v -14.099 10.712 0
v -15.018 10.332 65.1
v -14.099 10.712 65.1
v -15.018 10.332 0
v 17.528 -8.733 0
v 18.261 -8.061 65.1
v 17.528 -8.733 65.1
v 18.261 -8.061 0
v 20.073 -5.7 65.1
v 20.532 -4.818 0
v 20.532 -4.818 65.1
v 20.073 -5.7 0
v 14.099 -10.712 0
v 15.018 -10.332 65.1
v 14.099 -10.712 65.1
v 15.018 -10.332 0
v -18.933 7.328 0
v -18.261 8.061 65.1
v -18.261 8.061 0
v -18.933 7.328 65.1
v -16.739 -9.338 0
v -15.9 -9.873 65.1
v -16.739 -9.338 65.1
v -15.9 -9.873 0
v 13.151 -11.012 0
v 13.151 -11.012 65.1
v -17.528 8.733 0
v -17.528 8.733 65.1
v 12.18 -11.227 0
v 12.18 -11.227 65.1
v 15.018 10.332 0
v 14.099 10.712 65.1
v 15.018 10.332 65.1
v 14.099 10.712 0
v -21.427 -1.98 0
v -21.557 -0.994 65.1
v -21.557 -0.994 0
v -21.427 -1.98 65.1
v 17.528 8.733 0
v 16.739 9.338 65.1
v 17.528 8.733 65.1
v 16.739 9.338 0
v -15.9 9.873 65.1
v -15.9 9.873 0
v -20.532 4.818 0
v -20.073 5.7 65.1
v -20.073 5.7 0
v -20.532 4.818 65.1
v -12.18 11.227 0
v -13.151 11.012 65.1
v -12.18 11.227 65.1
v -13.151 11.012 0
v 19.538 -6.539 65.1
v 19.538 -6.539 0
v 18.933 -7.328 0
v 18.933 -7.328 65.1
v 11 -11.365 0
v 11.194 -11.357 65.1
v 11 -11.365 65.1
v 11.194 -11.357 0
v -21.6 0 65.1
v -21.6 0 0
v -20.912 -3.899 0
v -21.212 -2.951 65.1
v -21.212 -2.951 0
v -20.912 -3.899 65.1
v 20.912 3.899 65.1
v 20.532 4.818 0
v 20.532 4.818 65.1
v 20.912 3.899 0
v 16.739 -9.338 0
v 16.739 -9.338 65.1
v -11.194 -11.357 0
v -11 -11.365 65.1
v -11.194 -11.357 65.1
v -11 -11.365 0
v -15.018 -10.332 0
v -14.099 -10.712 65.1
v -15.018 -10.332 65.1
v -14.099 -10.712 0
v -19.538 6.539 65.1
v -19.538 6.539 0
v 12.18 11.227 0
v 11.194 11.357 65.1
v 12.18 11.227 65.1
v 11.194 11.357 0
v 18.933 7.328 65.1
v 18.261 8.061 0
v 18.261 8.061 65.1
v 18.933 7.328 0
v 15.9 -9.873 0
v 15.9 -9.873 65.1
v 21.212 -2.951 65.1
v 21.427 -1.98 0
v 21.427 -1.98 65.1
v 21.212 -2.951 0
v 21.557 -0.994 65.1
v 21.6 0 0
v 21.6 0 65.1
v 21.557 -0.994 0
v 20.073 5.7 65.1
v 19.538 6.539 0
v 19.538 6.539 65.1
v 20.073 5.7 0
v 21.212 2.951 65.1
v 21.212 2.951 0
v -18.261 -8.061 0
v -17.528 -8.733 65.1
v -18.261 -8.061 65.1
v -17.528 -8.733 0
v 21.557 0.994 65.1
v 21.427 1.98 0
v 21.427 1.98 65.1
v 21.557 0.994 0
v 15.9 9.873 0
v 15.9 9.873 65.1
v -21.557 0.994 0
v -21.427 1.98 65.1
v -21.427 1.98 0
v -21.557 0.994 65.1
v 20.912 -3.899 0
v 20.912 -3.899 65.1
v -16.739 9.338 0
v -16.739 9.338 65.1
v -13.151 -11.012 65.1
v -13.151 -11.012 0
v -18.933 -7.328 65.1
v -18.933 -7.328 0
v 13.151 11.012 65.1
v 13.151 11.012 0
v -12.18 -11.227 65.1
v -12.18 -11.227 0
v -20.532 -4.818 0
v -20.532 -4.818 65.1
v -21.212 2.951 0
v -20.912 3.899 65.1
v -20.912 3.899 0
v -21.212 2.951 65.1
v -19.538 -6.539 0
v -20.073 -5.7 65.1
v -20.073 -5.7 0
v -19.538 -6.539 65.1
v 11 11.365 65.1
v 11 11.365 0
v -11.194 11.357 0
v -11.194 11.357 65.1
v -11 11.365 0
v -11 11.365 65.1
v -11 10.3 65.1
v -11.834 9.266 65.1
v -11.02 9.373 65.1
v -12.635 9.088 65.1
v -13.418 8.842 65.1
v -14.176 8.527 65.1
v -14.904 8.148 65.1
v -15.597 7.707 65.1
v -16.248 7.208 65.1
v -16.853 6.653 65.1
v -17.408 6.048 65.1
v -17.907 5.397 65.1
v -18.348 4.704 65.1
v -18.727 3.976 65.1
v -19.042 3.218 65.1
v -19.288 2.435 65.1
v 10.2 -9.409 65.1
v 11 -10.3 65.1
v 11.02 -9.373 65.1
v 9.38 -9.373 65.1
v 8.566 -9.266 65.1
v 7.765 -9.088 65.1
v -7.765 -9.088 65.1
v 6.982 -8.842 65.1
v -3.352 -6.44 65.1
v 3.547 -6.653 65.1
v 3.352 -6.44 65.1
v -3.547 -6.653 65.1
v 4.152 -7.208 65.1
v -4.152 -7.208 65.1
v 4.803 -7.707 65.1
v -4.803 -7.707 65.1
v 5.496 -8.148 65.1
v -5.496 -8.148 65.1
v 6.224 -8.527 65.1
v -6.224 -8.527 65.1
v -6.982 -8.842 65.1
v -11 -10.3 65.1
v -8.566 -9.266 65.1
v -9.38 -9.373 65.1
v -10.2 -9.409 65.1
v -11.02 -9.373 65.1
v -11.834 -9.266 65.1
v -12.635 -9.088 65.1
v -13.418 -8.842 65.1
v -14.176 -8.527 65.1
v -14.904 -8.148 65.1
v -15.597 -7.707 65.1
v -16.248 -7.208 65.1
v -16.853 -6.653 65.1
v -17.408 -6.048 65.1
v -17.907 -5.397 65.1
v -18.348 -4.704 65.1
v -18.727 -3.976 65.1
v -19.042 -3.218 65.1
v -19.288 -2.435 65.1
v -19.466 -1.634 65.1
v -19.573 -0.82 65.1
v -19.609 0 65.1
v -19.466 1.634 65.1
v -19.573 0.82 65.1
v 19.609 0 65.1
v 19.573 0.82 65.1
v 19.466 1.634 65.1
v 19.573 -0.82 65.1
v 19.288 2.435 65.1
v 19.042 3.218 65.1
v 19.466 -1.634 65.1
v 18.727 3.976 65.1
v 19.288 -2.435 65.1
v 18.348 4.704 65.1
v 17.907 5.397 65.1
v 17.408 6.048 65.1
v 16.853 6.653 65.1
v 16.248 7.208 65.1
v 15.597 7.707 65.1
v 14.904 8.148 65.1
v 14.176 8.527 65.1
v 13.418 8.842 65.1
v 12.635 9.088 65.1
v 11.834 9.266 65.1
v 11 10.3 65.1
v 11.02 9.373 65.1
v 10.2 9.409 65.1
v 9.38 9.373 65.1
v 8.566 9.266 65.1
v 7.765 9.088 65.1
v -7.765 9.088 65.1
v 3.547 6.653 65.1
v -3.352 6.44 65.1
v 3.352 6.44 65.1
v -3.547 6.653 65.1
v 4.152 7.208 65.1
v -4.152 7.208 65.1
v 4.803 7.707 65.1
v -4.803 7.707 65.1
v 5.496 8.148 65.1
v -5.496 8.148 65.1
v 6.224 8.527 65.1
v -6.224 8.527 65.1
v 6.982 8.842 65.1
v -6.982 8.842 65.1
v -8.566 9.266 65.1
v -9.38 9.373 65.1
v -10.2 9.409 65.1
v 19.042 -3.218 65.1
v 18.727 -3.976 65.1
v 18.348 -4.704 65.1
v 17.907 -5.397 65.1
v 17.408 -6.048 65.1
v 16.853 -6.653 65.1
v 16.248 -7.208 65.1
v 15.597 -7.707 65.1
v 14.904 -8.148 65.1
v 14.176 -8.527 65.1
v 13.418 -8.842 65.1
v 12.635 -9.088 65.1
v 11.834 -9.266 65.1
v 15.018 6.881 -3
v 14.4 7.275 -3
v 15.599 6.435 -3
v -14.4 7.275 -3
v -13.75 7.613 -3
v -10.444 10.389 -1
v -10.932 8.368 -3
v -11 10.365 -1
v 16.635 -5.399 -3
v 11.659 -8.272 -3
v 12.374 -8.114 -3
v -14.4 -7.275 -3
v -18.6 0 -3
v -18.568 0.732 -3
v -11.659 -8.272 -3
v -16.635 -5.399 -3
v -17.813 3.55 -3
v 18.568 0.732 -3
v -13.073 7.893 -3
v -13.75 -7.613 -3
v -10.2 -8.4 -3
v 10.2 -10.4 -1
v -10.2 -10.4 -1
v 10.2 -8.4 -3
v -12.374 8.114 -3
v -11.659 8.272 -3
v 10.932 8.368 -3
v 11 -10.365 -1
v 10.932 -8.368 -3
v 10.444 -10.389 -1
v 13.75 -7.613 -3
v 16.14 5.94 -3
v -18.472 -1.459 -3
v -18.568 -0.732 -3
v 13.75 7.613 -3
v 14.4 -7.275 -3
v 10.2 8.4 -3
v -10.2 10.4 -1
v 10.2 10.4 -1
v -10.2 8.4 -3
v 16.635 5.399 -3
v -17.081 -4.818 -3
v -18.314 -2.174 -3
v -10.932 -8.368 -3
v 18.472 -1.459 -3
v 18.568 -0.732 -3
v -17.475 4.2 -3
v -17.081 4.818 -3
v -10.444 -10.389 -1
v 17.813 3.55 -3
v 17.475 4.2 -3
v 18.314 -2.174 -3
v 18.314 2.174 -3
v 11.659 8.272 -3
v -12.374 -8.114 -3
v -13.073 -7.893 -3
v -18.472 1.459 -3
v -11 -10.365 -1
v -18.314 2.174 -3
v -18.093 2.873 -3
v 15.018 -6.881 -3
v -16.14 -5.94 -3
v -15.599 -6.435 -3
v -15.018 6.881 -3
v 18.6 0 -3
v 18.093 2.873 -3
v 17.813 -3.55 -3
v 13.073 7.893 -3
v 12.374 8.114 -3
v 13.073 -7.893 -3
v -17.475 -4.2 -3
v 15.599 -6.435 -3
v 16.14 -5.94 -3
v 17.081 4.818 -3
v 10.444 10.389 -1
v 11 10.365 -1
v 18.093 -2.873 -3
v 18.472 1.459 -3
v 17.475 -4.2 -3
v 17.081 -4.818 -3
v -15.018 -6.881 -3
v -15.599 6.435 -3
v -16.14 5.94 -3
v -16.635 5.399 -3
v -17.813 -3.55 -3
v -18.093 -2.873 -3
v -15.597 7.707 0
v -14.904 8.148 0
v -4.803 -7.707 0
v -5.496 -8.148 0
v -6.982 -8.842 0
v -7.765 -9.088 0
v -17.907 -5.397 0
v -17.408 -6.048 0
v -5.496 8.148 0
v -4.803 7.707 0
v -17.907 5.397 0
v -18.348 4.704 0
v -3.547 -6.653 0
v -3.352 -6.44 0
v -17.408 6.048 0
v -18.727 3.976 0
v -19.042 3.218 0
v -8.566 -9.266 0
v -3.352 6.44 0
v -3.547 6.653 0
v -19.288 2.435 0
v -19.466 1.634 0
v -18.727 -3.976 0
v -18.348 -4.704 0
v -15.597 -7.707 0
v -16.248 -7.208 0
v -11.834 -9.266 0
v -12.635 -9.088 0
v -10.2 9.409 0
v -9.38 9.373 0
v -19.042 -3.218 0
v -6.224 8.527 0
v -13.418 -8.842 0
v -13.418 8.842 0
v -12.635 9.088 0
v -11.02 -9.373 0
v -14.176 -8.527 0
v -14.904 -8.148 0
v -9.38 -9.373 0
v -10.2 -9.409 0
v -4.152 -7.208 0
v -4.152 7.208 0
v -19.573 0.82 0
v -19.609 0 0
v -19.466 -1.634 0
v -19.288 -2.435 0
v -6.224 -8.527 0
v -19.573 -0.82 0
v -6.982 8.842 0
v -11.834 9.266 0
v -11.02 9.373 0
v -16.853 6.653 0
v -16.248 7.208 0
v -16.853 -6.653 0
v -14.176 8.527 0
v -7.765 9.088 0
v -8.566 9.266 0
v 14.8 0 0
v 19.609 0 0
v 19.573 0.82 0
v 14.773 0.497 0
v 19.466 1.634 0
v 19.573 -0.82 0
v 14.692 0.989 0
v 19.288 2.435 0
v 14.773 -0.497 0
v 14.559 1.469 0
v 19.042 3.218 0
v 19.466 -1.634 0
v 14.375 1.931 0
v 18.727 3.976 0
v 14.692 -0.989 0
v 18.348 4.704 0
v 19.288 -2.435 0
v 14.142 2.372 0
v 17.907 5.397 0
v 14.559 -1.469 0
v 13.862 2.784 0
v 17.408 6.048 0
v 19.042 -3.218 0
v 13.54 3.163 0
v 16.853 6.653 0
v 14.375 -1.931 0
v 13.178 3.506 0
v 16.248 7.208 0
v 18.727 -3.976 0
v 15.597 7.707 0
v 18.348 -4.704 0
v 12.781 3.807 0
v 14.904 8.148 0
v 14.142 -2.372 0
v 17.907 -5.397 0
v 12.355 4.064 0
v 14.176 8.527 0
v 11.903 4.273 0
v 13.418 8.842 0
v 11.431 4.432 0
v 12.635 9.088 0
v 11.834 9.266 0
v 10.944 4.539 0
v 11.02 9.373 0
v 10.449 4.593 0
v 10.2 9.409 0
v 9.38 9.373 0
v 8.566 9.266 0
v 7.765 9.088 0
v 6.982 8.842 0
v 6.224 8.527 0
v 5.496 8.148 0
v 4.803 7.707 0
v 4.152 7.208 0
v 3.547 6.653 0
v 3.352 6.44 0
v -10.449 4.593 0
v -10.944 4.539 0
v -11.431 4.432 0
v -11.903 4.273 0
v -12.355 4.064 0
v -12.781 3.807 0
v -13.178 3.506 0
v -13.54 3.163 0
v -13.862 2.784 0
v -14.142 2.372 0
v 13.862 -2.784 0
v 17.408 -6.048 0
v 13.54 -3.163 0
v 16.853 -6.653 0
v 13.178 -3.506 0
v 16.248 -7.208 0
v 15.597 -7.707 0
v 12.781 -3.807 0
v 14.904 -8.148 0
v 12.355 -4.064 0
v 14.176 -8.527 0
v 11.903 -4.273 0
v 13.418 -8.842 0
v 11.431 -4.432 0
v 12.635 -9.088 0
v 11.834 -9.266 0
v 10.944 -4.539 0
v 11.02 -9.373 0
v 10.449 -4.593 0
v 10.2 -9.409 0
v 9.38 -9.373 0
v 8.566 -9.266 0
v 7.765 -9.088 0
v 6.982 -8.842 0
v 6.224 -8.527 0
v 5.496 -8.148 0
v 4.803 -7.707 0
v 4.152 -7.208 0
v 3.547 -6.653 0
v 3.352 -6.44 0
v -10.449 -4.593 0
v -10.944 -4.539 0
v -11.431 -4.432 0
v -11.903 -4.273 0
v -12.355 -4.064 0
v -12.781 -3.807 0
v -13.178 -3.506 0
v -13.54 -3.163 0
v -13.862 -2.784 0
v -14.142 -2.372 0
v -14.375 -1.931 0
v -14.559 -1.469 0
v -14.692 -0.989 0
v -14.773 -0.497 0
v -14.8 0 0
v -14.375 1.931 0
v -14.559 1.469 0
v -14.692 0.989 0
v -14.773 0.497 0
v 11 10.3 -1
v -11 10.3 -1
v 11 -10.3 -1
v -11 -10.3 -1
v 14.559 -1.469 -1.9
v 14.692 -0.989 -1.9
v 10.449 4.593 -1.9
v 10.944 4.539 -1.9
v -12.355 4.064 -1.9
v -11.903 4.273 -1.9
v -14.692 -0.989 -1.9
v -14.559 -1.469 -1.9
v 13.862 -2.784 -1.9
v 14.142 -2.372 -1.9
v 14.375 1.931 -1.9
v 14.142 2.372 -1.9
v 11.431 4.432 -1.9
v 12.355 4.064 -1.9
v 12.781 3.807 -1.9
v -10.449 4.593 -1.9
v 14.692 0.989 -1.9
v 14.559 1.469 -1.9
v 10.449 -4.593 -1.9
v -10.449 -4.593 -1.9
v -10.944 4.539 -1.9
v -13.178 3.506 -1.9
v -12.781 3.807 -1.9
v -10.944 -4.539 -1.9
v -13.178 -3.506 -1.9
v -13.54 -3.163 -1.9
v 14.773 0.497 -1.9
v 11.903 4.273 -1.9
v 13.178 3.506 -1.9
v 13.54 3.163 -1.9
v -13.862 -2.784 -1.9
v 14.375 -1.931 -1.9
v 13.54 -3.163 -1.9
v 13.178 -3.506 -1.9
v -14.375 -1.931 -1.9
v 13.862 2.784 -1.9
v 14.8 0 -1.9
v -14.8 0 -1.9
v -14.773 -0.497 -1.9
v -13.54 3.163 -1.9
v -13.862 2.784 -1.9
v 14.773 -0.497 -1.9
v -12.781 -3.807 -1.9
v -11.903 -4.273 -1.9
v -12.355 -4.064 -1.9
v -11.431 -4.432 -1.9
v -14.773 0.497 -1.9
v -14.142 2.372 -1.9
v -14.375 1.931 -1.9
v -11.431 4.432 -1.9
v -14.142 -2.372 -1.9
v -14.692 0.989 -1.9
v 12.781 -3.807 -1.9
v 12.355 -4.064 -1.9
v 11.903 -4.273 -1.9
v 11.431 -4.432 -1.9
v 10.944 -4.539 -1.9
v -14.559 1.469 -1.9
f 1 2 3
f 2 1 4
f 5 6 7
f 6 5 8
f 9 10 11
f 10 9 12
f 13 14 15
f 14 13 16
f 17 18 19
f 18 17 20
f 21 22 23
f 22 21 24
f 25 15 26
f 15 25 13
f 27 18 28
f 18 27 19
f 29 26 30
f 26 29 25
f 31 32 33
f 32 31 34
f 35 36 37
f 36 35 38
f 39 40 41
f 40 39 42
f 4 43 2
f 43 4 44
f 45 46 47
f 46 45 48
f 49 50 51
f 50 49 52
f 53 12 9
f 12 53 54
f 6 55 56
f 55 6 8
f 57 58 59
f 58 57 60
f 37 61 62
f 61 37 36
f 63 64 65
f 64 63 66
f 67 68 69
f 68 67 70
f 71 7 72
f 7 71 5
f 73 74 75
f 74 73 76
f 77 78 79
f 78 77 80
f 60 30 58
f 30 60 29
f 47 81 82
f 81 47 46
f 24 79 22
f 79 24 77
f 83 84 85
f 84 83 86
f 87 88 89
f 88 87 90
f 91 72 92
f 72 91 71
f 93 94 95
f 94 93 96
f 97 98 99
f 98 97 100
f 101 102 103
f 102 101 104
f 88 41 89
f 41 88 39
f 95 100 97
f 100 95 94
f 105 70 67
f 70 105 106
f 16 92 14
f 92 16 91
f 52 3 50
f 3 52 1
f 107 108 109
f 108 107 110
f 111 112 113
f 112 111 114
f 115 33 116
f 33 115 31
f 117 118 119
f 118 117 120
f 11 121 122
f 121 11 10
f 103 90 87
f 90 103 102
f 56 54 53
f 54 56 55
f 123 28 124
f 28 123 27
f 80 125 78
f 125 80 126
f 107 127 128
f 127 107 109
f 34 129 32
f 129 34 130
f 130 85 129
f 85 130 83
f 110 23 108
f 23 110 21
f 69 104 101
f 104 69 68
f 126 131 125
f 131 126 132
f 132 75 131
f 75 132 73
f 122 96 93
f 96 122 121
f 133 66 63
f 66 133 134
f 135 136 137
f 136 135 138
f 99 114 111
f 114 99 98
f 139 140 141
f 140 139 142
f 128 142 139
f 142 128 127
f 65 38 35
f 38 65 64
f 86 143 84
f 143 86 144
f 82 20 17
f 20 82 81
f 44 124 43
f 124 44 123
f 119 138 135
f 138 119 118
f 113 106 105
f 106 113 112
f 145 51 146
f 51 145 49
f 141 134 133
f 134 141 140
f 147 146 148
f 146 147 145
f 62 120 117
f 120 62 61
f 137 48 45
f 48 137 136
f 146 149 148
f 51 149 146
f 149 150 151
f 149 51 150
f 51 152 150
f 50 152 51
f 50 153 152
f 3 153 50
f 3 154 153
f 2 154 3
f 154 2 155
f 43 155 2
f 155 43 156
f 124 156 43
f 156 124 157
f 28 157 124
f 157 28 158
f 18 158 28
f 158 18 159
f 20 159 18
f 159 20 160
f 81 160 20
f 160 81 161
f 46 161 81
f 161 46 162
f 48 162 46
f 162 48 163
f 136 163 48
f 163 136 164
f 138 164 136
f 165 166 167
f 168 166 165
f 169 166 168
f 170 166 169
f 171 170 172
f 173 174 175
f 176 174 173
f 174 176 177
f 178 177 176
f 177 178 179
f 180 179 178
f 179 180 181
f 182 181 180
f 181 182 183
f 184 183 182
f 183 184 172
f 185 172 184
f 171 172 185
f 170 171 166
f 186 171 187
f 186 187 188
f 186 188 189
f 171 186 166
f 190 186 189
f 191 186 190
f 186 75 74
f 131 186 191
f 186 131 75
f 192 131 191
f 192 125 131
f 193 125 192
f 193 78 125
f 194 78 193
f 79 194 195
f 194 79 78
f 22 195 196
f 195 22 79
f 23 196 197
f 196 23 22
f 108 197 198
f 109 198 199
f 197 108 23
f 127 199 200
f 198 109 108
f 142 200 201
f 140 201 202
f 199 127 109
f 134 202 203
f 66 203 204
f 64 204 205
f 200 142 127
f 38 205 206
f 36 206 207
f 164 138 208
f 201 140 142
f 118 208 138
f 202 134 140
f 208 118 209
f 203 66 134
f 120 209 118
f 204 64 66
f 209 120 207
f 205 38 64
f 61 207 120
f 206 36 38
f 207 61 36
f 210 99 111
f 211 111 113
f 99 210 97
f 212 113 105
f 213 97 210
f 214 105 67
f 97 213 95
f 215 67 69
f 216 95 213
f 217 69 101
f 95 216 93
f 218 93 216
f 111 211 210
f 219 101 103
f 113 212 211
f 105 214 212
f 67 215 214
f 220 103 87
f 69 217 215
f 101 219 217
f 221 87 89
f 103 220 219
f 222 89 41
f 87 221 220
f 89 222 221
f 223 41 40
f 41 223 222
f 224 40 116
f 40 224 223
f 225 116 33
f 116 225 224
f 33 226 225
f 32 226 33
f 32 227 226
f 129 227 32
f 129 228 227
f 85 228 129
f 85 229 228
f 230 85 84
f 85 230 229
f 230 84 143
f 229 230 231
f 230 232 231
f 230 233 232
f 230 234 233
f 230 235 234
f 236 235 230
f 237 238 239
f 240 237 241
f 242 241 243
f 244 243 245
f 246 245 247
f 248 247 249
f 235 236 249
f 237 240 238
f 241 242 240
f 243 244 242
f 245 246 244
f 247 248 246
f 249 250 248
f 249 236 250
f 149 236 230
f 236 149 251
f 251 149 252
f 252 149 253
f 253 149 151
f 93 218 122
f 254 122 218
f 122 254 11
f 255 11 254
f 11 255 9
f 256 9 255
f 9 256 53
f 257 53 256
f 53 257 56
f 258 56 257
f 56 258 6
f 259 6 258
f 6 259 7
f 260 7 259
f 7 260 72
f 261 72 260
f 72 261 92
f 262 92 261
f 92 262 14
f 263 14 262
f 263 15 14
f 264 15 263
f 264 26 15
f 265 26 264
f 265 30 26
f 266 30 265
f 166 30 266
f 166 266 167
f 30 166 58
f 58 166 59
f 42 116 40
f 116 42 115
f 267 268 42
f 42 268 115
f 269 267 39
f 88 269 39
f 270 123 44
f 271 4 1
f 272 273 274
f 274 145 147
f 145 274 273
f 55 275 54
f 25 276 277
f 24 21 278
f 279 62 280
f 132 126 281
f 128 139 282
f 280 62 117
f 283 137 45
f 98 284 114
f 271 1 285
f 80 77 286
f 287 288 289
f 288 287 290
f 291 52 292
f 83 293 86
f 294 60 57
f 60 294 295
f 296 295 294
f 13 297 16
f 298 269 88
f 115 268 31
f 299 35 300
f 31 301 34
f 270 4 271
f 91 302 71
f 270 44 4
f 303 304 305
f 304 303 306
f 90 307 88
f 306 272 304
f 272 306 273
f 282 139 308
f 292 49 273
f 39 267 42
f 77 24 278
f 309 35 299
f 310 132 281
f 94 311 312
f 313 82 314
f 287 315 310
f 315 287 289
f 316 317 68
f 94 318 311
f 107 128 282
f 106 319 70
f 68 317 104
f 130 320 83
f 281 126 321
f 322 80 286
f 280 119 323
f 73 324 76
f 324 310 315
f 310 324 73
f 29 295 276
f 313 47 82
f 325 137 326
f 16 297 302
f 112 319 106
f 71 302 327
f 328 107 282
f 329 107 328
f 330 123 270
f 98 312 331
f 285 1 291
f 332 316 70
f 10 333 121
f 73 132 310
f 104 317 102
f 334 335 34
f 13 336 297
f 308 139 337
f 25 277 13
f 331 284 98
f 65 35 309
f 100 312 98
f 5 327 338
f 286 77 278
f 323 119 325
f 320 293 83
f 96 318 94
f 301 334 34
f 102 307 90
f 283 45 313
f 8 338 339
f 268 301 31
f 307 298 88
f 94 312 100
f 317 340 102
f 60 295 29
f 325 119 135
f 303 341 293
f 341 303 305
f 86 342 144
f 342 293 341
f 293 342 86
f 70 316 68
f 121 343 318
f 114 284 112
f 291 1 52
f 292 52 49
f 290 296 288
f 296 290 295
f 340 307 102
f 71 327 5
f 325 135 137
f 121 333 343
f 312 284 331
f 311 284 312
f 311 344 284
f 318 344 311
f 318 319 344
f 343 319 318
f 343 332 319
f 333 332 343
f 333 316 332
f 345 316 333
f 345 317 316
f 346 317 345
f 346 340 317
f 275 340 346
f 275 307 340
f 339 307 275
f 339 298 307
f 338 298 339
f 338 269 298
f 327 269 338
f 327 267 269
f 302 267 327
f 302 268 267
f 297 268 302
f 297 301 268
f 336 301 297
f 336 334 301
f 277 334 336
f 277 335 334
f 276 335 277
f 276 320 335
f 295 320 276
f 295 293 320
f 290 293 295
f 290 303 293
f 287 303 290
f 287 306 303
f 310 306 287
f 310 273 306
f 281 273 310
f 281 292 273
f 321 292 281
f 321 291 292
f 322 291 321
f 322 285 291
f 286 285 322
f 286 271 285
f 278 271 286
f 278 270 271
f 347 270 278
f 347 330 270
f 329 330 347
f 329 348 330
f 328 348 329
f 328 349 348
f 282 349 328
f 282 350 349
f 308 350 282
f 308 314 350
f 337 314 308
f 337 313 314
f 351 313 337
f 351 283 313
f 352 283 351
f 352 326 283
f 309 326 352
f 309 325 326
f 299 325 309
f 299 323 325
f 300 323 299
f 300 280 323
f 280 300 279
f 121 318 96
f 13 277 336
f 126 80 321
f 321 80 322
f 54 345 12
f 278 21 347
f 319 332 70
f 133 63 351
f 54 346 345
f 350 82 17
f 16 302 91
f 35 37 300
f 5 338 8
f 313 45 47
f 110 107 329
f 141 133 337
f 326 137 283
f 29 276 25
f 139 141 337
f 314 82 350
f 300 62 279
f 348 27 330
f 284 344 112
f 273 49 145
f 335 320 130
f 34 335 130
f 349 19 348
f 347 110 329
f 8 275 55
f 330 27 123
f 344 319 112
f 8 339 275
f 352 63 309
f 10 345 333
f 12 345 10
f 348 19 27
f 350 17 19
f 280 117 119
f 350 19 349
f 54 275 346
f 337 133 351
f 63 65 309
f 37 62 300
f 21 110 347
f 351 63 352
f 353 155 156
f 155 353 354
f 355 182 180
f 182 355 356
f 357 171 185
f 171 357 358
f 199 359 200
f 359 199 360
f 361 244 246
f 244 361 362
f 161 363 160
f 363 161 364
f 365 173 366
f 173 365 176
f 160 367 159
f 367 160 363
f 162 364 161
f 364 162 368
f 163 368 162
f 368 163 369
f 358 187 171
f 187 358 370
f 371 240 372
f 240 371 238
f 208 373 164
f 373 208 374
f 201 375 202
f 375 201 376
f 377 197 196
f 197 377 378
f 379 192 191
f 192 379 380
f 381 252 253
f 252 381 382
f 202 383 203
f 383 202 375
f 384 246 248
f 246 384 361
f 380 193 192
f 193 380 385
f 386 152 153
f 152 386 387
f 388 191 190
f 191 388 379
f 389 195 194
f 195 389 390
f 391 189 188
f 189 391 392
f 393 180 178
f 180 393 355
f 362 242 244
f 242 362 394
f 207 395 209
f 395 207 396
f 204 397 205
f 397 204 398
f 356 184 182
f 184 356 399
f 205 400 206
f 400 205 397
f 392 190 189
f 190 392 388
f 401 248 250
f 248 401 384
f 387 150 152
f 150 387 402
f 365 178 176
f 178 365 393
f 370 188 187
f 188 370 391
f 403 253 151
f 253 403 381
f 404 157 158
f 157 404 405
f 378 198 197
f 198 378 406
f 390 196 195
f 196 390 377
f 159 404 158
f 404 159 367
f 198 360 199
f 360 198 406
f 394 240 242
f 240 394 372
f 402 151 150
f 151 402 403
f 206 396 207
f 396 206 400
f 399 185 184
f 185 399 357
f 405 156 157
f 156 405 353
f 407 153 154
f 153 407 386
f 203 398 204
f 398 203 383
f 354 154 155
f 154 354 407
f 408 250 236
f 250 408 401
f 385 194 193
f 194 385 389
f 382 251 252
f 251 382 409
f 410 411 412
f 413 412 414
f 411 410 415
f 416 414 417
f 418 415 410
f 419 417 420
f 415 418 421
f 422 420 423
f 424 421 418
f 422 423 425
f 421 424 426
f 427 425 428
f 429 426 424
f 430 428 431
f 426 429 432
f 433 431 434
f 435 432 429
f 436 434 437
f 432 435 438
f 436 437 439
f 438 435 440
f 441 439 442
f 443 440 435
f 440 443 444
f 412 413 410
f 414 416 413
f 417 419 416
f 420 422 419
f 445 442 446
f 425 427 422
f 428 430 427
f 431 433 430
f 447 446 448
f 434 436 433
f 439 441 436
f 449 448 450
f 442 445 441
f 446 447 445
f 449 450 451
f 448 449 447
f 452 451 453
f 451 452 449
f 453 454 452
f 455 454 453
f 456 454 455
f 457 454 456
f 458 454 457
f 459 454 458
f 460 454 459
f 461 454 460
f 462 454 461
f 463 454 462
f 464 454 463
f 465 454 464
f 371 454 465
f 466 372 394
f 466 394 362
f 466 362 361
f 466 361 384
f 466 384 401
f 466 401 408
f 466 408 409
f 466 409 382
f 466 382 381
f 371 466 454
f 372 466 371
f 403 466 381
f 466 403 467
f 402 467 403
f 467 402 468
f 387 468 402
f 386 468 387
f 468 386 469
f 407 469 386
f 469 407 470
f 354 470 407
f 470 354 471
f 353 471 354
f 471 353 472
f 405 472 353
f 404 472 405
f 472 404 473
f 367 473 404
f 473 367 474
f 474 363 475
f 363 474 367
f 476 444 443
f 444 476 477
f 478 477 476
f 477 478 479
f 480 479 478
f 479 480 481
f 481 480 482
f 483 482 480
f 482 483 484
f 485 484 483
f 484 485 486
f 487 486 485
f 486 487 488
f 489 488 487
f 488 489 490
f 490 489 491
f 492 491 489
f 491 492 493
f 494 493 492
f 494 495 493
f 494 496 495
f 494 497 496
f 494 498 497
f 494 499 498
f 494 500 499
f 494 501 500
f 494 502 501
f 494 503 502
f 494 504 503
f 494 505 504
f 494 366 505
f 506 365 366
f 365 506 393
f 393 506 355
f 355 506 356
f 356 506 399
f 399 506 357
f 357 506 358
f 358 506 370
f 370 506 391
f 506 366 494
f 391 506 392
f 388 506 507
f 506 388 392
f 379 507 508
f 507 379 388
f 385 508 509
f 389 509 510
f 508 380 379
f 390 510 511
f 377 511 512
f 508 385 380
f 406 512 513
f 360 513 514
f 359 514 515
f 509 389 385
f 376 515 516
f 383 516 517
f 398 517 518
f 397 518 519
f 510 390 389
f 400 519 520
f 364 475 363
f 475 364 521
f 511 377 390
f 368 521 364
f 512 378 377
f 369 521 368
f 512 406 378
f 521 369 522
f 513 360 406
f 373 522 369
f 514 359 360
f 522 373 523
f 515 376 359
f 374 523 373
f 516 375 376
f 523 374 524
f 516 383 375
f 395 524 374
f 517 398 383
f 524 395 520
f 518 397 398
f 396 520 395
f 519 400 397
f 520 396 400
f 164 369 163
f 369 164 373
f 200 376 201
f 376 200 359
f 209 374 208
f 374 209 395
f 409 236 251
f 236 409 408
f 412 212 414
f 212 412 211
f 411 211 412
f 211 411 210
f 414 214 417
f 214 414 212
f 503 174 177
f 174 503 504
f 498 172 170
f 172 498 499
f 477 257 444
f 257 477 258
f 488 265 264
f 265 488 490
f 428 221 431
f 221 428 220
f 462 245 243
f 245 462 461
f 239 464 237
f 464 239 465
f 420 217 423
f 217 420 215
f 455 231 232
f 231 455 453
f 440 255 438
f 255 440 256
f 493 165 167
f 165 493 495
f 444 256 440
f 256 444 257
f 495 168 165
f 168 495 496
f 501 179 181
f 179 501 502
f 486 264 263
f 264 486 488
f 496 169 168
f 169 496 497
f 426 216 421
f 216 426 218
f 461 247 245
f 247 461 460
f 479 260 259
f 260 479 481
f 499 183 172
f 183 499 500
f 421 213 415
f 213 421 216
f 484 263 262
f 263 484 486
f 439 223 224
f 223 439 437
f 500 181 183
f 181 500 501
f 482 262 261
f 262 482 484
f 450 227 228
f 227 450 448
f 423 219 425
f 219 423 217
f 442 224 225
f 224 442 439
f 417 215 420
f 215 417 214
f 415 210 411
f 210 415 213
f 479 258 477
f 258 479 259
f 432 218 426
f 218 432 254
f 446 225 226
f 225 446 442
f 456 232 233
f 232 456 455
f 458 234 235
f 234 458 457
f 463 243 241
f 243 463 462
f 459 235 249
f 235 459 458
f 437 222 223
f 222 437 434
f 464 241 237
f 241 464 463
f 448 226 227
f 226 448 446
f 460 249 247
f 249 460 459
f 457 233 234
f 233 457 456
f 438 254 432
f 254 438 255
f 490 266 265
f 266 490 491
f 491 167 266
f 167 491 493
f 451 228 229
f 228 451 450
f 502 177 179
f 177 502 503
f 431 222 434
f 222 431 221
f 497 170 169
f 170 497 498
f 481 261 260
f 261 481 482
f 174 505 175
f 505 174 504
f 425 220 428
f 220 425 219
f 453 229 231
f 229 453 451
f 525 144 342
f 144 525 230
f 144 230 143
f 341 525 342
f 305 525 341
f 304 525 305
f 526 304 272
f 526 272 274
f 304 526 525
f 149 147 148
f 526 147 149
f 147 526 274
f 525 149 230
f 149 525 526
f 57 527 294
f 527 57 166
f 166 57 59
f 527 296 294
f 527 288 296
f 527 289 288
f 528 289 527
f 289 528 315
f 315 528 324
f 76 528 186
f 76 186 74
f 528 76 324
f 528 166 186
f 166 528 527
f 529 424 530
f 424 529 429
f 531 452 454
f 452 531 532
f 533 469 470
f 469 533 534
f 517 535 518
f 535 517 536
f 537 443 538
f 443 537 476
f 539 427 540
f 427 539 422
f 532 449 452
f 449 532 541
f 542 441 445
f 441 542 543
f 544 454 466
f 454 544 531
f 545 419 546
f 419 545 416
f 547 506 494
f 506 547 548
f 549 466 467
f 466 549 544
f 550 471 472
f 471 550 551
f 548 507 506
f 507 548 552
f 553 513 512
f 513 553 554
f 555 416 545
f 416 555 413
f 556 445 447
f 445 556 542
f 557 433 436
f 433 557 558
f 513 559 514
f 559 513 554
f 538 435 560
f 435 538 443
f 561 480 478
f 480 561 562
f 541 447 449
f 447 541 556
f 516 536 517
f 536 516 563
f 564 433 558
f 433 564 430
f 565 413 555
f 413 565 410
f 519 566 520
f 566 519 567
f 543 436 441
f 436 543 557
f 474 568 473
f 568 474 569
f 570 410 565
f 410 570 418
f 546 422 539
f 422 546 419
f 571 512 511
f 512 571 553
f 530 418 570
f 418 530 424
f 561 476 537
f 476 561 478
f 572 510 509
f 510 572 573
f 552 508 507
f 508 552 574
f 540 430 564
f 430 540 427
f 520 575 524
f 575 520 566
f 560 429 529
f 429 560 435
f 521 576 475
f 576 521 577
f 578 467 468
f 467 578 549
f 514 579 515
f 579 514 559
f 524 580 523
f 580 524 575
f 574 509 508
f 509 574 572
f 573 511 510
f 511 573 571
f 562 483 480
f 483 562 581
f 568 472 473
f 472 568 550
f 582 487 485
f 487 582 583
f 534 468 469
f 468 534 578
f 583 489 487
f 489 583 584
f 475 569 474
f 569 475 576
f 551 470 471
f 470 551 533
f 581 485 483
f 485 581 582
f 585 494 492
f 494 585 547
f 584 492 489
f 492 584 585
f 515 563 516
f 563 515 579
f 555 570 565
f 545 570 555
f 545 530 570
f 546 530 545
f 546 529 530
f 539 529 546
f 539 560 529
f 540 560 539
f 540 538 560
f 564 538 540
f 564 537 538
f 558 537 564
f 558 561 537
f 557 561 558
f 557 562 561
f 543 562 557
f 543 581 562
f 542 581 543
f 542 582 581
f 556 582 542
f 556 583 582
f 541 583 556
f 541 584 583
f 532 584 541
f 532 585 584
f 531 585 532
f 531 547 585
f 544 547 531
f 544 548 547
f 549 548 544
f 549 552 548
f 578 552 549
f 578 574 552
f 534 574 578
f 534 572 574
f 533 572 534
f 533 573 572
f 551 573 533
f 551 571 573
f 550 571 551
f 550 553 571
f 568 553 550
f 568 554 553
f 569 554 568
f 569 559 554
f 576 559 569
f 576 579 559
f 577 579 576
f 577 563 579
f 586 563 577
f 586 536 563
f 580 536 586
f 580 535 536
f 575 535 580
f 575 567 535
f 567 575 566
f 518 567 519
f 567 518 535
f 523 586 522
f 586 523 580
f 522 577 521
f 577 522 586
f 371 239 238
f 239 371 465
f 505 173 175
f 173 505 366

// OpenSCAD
$fa = 5;
$fs = 0.5;

function D(d) =
    let(segment = d * tan($fa / 2))
    $fn > 0
    ? d / cos(180 / $fn)
    : segment > $fs
        ? d / cos($fa / 2)
        : sqrt(pow($fs / 2, 2) + pow(d / 2, 2)) * 2;


cell_d = 18.4;
cell_h = 65.1;

lead_wire_d = 2.5;
balance_wire_d = 1.7;

strap_w = 1.8;
strap_l = 22;

cell_tolerance = 0.2;
hatch_tolerance = 0.1;

butt_h = 3;

t = 2;

difference(){
    main();

    // translate([-100, 0, -100])
    // cube([200, 200, 200]);
}

module main() {
    cell_offset = (cell_d + t) / 2;

    difference() {
        union() {
            hull() {
                for (x = [-cell_offset, cell_offset]) {
                    translate([x, 0])
                    cylinder(d=cell_d + t * 2 + cell_tolerance * 2, h=cell_h);
                }
            }

            hull() {
                for (x = [-cell_offset, cell_offset]) {
                    translate([x, 0, -butt_h])
                    cylinder(d1=cell_d + t * 2 + cell_tolerance * 2 - butt_h * 2, d2=cell_d + t * 2 + cell_tolerance * 2, h=butt_h);
                }
            }
        }

        hull() {
            for (x = [-cell_offset, cell_offset]) {
                translate([x, 0, -balance_wire_d - cell_tolerance])
                cylinder(d=cell_d / 2, h=balance_wire_d + cell_tolerance + 1);
            }
        }

        for (x = [-cell_offset, cell_offset]) {
            translate([x, 0])
            cylinder(d=D(cell_d + cell_tolerance * 2), h=cell_h + 2);
        }

        middle_cutout_w = cell_d * 0.7;

        translate([-cell_d / 2, -middle_cutout_w / 2])
        cube([cell_d, middle_cutout_w, cell_h + 2]);

        strap_cutout_y = cell_d / 2 + t + cell_tolerance - 0.2;

        for (y = [strap_cutout_y, -strap_cutout_y]) {
            translate([-strap_l / 2, -strap_w / 2 + y, -1])
            cube([strap_l, strap_w, cell_h + 2]);
        }
    }
}
